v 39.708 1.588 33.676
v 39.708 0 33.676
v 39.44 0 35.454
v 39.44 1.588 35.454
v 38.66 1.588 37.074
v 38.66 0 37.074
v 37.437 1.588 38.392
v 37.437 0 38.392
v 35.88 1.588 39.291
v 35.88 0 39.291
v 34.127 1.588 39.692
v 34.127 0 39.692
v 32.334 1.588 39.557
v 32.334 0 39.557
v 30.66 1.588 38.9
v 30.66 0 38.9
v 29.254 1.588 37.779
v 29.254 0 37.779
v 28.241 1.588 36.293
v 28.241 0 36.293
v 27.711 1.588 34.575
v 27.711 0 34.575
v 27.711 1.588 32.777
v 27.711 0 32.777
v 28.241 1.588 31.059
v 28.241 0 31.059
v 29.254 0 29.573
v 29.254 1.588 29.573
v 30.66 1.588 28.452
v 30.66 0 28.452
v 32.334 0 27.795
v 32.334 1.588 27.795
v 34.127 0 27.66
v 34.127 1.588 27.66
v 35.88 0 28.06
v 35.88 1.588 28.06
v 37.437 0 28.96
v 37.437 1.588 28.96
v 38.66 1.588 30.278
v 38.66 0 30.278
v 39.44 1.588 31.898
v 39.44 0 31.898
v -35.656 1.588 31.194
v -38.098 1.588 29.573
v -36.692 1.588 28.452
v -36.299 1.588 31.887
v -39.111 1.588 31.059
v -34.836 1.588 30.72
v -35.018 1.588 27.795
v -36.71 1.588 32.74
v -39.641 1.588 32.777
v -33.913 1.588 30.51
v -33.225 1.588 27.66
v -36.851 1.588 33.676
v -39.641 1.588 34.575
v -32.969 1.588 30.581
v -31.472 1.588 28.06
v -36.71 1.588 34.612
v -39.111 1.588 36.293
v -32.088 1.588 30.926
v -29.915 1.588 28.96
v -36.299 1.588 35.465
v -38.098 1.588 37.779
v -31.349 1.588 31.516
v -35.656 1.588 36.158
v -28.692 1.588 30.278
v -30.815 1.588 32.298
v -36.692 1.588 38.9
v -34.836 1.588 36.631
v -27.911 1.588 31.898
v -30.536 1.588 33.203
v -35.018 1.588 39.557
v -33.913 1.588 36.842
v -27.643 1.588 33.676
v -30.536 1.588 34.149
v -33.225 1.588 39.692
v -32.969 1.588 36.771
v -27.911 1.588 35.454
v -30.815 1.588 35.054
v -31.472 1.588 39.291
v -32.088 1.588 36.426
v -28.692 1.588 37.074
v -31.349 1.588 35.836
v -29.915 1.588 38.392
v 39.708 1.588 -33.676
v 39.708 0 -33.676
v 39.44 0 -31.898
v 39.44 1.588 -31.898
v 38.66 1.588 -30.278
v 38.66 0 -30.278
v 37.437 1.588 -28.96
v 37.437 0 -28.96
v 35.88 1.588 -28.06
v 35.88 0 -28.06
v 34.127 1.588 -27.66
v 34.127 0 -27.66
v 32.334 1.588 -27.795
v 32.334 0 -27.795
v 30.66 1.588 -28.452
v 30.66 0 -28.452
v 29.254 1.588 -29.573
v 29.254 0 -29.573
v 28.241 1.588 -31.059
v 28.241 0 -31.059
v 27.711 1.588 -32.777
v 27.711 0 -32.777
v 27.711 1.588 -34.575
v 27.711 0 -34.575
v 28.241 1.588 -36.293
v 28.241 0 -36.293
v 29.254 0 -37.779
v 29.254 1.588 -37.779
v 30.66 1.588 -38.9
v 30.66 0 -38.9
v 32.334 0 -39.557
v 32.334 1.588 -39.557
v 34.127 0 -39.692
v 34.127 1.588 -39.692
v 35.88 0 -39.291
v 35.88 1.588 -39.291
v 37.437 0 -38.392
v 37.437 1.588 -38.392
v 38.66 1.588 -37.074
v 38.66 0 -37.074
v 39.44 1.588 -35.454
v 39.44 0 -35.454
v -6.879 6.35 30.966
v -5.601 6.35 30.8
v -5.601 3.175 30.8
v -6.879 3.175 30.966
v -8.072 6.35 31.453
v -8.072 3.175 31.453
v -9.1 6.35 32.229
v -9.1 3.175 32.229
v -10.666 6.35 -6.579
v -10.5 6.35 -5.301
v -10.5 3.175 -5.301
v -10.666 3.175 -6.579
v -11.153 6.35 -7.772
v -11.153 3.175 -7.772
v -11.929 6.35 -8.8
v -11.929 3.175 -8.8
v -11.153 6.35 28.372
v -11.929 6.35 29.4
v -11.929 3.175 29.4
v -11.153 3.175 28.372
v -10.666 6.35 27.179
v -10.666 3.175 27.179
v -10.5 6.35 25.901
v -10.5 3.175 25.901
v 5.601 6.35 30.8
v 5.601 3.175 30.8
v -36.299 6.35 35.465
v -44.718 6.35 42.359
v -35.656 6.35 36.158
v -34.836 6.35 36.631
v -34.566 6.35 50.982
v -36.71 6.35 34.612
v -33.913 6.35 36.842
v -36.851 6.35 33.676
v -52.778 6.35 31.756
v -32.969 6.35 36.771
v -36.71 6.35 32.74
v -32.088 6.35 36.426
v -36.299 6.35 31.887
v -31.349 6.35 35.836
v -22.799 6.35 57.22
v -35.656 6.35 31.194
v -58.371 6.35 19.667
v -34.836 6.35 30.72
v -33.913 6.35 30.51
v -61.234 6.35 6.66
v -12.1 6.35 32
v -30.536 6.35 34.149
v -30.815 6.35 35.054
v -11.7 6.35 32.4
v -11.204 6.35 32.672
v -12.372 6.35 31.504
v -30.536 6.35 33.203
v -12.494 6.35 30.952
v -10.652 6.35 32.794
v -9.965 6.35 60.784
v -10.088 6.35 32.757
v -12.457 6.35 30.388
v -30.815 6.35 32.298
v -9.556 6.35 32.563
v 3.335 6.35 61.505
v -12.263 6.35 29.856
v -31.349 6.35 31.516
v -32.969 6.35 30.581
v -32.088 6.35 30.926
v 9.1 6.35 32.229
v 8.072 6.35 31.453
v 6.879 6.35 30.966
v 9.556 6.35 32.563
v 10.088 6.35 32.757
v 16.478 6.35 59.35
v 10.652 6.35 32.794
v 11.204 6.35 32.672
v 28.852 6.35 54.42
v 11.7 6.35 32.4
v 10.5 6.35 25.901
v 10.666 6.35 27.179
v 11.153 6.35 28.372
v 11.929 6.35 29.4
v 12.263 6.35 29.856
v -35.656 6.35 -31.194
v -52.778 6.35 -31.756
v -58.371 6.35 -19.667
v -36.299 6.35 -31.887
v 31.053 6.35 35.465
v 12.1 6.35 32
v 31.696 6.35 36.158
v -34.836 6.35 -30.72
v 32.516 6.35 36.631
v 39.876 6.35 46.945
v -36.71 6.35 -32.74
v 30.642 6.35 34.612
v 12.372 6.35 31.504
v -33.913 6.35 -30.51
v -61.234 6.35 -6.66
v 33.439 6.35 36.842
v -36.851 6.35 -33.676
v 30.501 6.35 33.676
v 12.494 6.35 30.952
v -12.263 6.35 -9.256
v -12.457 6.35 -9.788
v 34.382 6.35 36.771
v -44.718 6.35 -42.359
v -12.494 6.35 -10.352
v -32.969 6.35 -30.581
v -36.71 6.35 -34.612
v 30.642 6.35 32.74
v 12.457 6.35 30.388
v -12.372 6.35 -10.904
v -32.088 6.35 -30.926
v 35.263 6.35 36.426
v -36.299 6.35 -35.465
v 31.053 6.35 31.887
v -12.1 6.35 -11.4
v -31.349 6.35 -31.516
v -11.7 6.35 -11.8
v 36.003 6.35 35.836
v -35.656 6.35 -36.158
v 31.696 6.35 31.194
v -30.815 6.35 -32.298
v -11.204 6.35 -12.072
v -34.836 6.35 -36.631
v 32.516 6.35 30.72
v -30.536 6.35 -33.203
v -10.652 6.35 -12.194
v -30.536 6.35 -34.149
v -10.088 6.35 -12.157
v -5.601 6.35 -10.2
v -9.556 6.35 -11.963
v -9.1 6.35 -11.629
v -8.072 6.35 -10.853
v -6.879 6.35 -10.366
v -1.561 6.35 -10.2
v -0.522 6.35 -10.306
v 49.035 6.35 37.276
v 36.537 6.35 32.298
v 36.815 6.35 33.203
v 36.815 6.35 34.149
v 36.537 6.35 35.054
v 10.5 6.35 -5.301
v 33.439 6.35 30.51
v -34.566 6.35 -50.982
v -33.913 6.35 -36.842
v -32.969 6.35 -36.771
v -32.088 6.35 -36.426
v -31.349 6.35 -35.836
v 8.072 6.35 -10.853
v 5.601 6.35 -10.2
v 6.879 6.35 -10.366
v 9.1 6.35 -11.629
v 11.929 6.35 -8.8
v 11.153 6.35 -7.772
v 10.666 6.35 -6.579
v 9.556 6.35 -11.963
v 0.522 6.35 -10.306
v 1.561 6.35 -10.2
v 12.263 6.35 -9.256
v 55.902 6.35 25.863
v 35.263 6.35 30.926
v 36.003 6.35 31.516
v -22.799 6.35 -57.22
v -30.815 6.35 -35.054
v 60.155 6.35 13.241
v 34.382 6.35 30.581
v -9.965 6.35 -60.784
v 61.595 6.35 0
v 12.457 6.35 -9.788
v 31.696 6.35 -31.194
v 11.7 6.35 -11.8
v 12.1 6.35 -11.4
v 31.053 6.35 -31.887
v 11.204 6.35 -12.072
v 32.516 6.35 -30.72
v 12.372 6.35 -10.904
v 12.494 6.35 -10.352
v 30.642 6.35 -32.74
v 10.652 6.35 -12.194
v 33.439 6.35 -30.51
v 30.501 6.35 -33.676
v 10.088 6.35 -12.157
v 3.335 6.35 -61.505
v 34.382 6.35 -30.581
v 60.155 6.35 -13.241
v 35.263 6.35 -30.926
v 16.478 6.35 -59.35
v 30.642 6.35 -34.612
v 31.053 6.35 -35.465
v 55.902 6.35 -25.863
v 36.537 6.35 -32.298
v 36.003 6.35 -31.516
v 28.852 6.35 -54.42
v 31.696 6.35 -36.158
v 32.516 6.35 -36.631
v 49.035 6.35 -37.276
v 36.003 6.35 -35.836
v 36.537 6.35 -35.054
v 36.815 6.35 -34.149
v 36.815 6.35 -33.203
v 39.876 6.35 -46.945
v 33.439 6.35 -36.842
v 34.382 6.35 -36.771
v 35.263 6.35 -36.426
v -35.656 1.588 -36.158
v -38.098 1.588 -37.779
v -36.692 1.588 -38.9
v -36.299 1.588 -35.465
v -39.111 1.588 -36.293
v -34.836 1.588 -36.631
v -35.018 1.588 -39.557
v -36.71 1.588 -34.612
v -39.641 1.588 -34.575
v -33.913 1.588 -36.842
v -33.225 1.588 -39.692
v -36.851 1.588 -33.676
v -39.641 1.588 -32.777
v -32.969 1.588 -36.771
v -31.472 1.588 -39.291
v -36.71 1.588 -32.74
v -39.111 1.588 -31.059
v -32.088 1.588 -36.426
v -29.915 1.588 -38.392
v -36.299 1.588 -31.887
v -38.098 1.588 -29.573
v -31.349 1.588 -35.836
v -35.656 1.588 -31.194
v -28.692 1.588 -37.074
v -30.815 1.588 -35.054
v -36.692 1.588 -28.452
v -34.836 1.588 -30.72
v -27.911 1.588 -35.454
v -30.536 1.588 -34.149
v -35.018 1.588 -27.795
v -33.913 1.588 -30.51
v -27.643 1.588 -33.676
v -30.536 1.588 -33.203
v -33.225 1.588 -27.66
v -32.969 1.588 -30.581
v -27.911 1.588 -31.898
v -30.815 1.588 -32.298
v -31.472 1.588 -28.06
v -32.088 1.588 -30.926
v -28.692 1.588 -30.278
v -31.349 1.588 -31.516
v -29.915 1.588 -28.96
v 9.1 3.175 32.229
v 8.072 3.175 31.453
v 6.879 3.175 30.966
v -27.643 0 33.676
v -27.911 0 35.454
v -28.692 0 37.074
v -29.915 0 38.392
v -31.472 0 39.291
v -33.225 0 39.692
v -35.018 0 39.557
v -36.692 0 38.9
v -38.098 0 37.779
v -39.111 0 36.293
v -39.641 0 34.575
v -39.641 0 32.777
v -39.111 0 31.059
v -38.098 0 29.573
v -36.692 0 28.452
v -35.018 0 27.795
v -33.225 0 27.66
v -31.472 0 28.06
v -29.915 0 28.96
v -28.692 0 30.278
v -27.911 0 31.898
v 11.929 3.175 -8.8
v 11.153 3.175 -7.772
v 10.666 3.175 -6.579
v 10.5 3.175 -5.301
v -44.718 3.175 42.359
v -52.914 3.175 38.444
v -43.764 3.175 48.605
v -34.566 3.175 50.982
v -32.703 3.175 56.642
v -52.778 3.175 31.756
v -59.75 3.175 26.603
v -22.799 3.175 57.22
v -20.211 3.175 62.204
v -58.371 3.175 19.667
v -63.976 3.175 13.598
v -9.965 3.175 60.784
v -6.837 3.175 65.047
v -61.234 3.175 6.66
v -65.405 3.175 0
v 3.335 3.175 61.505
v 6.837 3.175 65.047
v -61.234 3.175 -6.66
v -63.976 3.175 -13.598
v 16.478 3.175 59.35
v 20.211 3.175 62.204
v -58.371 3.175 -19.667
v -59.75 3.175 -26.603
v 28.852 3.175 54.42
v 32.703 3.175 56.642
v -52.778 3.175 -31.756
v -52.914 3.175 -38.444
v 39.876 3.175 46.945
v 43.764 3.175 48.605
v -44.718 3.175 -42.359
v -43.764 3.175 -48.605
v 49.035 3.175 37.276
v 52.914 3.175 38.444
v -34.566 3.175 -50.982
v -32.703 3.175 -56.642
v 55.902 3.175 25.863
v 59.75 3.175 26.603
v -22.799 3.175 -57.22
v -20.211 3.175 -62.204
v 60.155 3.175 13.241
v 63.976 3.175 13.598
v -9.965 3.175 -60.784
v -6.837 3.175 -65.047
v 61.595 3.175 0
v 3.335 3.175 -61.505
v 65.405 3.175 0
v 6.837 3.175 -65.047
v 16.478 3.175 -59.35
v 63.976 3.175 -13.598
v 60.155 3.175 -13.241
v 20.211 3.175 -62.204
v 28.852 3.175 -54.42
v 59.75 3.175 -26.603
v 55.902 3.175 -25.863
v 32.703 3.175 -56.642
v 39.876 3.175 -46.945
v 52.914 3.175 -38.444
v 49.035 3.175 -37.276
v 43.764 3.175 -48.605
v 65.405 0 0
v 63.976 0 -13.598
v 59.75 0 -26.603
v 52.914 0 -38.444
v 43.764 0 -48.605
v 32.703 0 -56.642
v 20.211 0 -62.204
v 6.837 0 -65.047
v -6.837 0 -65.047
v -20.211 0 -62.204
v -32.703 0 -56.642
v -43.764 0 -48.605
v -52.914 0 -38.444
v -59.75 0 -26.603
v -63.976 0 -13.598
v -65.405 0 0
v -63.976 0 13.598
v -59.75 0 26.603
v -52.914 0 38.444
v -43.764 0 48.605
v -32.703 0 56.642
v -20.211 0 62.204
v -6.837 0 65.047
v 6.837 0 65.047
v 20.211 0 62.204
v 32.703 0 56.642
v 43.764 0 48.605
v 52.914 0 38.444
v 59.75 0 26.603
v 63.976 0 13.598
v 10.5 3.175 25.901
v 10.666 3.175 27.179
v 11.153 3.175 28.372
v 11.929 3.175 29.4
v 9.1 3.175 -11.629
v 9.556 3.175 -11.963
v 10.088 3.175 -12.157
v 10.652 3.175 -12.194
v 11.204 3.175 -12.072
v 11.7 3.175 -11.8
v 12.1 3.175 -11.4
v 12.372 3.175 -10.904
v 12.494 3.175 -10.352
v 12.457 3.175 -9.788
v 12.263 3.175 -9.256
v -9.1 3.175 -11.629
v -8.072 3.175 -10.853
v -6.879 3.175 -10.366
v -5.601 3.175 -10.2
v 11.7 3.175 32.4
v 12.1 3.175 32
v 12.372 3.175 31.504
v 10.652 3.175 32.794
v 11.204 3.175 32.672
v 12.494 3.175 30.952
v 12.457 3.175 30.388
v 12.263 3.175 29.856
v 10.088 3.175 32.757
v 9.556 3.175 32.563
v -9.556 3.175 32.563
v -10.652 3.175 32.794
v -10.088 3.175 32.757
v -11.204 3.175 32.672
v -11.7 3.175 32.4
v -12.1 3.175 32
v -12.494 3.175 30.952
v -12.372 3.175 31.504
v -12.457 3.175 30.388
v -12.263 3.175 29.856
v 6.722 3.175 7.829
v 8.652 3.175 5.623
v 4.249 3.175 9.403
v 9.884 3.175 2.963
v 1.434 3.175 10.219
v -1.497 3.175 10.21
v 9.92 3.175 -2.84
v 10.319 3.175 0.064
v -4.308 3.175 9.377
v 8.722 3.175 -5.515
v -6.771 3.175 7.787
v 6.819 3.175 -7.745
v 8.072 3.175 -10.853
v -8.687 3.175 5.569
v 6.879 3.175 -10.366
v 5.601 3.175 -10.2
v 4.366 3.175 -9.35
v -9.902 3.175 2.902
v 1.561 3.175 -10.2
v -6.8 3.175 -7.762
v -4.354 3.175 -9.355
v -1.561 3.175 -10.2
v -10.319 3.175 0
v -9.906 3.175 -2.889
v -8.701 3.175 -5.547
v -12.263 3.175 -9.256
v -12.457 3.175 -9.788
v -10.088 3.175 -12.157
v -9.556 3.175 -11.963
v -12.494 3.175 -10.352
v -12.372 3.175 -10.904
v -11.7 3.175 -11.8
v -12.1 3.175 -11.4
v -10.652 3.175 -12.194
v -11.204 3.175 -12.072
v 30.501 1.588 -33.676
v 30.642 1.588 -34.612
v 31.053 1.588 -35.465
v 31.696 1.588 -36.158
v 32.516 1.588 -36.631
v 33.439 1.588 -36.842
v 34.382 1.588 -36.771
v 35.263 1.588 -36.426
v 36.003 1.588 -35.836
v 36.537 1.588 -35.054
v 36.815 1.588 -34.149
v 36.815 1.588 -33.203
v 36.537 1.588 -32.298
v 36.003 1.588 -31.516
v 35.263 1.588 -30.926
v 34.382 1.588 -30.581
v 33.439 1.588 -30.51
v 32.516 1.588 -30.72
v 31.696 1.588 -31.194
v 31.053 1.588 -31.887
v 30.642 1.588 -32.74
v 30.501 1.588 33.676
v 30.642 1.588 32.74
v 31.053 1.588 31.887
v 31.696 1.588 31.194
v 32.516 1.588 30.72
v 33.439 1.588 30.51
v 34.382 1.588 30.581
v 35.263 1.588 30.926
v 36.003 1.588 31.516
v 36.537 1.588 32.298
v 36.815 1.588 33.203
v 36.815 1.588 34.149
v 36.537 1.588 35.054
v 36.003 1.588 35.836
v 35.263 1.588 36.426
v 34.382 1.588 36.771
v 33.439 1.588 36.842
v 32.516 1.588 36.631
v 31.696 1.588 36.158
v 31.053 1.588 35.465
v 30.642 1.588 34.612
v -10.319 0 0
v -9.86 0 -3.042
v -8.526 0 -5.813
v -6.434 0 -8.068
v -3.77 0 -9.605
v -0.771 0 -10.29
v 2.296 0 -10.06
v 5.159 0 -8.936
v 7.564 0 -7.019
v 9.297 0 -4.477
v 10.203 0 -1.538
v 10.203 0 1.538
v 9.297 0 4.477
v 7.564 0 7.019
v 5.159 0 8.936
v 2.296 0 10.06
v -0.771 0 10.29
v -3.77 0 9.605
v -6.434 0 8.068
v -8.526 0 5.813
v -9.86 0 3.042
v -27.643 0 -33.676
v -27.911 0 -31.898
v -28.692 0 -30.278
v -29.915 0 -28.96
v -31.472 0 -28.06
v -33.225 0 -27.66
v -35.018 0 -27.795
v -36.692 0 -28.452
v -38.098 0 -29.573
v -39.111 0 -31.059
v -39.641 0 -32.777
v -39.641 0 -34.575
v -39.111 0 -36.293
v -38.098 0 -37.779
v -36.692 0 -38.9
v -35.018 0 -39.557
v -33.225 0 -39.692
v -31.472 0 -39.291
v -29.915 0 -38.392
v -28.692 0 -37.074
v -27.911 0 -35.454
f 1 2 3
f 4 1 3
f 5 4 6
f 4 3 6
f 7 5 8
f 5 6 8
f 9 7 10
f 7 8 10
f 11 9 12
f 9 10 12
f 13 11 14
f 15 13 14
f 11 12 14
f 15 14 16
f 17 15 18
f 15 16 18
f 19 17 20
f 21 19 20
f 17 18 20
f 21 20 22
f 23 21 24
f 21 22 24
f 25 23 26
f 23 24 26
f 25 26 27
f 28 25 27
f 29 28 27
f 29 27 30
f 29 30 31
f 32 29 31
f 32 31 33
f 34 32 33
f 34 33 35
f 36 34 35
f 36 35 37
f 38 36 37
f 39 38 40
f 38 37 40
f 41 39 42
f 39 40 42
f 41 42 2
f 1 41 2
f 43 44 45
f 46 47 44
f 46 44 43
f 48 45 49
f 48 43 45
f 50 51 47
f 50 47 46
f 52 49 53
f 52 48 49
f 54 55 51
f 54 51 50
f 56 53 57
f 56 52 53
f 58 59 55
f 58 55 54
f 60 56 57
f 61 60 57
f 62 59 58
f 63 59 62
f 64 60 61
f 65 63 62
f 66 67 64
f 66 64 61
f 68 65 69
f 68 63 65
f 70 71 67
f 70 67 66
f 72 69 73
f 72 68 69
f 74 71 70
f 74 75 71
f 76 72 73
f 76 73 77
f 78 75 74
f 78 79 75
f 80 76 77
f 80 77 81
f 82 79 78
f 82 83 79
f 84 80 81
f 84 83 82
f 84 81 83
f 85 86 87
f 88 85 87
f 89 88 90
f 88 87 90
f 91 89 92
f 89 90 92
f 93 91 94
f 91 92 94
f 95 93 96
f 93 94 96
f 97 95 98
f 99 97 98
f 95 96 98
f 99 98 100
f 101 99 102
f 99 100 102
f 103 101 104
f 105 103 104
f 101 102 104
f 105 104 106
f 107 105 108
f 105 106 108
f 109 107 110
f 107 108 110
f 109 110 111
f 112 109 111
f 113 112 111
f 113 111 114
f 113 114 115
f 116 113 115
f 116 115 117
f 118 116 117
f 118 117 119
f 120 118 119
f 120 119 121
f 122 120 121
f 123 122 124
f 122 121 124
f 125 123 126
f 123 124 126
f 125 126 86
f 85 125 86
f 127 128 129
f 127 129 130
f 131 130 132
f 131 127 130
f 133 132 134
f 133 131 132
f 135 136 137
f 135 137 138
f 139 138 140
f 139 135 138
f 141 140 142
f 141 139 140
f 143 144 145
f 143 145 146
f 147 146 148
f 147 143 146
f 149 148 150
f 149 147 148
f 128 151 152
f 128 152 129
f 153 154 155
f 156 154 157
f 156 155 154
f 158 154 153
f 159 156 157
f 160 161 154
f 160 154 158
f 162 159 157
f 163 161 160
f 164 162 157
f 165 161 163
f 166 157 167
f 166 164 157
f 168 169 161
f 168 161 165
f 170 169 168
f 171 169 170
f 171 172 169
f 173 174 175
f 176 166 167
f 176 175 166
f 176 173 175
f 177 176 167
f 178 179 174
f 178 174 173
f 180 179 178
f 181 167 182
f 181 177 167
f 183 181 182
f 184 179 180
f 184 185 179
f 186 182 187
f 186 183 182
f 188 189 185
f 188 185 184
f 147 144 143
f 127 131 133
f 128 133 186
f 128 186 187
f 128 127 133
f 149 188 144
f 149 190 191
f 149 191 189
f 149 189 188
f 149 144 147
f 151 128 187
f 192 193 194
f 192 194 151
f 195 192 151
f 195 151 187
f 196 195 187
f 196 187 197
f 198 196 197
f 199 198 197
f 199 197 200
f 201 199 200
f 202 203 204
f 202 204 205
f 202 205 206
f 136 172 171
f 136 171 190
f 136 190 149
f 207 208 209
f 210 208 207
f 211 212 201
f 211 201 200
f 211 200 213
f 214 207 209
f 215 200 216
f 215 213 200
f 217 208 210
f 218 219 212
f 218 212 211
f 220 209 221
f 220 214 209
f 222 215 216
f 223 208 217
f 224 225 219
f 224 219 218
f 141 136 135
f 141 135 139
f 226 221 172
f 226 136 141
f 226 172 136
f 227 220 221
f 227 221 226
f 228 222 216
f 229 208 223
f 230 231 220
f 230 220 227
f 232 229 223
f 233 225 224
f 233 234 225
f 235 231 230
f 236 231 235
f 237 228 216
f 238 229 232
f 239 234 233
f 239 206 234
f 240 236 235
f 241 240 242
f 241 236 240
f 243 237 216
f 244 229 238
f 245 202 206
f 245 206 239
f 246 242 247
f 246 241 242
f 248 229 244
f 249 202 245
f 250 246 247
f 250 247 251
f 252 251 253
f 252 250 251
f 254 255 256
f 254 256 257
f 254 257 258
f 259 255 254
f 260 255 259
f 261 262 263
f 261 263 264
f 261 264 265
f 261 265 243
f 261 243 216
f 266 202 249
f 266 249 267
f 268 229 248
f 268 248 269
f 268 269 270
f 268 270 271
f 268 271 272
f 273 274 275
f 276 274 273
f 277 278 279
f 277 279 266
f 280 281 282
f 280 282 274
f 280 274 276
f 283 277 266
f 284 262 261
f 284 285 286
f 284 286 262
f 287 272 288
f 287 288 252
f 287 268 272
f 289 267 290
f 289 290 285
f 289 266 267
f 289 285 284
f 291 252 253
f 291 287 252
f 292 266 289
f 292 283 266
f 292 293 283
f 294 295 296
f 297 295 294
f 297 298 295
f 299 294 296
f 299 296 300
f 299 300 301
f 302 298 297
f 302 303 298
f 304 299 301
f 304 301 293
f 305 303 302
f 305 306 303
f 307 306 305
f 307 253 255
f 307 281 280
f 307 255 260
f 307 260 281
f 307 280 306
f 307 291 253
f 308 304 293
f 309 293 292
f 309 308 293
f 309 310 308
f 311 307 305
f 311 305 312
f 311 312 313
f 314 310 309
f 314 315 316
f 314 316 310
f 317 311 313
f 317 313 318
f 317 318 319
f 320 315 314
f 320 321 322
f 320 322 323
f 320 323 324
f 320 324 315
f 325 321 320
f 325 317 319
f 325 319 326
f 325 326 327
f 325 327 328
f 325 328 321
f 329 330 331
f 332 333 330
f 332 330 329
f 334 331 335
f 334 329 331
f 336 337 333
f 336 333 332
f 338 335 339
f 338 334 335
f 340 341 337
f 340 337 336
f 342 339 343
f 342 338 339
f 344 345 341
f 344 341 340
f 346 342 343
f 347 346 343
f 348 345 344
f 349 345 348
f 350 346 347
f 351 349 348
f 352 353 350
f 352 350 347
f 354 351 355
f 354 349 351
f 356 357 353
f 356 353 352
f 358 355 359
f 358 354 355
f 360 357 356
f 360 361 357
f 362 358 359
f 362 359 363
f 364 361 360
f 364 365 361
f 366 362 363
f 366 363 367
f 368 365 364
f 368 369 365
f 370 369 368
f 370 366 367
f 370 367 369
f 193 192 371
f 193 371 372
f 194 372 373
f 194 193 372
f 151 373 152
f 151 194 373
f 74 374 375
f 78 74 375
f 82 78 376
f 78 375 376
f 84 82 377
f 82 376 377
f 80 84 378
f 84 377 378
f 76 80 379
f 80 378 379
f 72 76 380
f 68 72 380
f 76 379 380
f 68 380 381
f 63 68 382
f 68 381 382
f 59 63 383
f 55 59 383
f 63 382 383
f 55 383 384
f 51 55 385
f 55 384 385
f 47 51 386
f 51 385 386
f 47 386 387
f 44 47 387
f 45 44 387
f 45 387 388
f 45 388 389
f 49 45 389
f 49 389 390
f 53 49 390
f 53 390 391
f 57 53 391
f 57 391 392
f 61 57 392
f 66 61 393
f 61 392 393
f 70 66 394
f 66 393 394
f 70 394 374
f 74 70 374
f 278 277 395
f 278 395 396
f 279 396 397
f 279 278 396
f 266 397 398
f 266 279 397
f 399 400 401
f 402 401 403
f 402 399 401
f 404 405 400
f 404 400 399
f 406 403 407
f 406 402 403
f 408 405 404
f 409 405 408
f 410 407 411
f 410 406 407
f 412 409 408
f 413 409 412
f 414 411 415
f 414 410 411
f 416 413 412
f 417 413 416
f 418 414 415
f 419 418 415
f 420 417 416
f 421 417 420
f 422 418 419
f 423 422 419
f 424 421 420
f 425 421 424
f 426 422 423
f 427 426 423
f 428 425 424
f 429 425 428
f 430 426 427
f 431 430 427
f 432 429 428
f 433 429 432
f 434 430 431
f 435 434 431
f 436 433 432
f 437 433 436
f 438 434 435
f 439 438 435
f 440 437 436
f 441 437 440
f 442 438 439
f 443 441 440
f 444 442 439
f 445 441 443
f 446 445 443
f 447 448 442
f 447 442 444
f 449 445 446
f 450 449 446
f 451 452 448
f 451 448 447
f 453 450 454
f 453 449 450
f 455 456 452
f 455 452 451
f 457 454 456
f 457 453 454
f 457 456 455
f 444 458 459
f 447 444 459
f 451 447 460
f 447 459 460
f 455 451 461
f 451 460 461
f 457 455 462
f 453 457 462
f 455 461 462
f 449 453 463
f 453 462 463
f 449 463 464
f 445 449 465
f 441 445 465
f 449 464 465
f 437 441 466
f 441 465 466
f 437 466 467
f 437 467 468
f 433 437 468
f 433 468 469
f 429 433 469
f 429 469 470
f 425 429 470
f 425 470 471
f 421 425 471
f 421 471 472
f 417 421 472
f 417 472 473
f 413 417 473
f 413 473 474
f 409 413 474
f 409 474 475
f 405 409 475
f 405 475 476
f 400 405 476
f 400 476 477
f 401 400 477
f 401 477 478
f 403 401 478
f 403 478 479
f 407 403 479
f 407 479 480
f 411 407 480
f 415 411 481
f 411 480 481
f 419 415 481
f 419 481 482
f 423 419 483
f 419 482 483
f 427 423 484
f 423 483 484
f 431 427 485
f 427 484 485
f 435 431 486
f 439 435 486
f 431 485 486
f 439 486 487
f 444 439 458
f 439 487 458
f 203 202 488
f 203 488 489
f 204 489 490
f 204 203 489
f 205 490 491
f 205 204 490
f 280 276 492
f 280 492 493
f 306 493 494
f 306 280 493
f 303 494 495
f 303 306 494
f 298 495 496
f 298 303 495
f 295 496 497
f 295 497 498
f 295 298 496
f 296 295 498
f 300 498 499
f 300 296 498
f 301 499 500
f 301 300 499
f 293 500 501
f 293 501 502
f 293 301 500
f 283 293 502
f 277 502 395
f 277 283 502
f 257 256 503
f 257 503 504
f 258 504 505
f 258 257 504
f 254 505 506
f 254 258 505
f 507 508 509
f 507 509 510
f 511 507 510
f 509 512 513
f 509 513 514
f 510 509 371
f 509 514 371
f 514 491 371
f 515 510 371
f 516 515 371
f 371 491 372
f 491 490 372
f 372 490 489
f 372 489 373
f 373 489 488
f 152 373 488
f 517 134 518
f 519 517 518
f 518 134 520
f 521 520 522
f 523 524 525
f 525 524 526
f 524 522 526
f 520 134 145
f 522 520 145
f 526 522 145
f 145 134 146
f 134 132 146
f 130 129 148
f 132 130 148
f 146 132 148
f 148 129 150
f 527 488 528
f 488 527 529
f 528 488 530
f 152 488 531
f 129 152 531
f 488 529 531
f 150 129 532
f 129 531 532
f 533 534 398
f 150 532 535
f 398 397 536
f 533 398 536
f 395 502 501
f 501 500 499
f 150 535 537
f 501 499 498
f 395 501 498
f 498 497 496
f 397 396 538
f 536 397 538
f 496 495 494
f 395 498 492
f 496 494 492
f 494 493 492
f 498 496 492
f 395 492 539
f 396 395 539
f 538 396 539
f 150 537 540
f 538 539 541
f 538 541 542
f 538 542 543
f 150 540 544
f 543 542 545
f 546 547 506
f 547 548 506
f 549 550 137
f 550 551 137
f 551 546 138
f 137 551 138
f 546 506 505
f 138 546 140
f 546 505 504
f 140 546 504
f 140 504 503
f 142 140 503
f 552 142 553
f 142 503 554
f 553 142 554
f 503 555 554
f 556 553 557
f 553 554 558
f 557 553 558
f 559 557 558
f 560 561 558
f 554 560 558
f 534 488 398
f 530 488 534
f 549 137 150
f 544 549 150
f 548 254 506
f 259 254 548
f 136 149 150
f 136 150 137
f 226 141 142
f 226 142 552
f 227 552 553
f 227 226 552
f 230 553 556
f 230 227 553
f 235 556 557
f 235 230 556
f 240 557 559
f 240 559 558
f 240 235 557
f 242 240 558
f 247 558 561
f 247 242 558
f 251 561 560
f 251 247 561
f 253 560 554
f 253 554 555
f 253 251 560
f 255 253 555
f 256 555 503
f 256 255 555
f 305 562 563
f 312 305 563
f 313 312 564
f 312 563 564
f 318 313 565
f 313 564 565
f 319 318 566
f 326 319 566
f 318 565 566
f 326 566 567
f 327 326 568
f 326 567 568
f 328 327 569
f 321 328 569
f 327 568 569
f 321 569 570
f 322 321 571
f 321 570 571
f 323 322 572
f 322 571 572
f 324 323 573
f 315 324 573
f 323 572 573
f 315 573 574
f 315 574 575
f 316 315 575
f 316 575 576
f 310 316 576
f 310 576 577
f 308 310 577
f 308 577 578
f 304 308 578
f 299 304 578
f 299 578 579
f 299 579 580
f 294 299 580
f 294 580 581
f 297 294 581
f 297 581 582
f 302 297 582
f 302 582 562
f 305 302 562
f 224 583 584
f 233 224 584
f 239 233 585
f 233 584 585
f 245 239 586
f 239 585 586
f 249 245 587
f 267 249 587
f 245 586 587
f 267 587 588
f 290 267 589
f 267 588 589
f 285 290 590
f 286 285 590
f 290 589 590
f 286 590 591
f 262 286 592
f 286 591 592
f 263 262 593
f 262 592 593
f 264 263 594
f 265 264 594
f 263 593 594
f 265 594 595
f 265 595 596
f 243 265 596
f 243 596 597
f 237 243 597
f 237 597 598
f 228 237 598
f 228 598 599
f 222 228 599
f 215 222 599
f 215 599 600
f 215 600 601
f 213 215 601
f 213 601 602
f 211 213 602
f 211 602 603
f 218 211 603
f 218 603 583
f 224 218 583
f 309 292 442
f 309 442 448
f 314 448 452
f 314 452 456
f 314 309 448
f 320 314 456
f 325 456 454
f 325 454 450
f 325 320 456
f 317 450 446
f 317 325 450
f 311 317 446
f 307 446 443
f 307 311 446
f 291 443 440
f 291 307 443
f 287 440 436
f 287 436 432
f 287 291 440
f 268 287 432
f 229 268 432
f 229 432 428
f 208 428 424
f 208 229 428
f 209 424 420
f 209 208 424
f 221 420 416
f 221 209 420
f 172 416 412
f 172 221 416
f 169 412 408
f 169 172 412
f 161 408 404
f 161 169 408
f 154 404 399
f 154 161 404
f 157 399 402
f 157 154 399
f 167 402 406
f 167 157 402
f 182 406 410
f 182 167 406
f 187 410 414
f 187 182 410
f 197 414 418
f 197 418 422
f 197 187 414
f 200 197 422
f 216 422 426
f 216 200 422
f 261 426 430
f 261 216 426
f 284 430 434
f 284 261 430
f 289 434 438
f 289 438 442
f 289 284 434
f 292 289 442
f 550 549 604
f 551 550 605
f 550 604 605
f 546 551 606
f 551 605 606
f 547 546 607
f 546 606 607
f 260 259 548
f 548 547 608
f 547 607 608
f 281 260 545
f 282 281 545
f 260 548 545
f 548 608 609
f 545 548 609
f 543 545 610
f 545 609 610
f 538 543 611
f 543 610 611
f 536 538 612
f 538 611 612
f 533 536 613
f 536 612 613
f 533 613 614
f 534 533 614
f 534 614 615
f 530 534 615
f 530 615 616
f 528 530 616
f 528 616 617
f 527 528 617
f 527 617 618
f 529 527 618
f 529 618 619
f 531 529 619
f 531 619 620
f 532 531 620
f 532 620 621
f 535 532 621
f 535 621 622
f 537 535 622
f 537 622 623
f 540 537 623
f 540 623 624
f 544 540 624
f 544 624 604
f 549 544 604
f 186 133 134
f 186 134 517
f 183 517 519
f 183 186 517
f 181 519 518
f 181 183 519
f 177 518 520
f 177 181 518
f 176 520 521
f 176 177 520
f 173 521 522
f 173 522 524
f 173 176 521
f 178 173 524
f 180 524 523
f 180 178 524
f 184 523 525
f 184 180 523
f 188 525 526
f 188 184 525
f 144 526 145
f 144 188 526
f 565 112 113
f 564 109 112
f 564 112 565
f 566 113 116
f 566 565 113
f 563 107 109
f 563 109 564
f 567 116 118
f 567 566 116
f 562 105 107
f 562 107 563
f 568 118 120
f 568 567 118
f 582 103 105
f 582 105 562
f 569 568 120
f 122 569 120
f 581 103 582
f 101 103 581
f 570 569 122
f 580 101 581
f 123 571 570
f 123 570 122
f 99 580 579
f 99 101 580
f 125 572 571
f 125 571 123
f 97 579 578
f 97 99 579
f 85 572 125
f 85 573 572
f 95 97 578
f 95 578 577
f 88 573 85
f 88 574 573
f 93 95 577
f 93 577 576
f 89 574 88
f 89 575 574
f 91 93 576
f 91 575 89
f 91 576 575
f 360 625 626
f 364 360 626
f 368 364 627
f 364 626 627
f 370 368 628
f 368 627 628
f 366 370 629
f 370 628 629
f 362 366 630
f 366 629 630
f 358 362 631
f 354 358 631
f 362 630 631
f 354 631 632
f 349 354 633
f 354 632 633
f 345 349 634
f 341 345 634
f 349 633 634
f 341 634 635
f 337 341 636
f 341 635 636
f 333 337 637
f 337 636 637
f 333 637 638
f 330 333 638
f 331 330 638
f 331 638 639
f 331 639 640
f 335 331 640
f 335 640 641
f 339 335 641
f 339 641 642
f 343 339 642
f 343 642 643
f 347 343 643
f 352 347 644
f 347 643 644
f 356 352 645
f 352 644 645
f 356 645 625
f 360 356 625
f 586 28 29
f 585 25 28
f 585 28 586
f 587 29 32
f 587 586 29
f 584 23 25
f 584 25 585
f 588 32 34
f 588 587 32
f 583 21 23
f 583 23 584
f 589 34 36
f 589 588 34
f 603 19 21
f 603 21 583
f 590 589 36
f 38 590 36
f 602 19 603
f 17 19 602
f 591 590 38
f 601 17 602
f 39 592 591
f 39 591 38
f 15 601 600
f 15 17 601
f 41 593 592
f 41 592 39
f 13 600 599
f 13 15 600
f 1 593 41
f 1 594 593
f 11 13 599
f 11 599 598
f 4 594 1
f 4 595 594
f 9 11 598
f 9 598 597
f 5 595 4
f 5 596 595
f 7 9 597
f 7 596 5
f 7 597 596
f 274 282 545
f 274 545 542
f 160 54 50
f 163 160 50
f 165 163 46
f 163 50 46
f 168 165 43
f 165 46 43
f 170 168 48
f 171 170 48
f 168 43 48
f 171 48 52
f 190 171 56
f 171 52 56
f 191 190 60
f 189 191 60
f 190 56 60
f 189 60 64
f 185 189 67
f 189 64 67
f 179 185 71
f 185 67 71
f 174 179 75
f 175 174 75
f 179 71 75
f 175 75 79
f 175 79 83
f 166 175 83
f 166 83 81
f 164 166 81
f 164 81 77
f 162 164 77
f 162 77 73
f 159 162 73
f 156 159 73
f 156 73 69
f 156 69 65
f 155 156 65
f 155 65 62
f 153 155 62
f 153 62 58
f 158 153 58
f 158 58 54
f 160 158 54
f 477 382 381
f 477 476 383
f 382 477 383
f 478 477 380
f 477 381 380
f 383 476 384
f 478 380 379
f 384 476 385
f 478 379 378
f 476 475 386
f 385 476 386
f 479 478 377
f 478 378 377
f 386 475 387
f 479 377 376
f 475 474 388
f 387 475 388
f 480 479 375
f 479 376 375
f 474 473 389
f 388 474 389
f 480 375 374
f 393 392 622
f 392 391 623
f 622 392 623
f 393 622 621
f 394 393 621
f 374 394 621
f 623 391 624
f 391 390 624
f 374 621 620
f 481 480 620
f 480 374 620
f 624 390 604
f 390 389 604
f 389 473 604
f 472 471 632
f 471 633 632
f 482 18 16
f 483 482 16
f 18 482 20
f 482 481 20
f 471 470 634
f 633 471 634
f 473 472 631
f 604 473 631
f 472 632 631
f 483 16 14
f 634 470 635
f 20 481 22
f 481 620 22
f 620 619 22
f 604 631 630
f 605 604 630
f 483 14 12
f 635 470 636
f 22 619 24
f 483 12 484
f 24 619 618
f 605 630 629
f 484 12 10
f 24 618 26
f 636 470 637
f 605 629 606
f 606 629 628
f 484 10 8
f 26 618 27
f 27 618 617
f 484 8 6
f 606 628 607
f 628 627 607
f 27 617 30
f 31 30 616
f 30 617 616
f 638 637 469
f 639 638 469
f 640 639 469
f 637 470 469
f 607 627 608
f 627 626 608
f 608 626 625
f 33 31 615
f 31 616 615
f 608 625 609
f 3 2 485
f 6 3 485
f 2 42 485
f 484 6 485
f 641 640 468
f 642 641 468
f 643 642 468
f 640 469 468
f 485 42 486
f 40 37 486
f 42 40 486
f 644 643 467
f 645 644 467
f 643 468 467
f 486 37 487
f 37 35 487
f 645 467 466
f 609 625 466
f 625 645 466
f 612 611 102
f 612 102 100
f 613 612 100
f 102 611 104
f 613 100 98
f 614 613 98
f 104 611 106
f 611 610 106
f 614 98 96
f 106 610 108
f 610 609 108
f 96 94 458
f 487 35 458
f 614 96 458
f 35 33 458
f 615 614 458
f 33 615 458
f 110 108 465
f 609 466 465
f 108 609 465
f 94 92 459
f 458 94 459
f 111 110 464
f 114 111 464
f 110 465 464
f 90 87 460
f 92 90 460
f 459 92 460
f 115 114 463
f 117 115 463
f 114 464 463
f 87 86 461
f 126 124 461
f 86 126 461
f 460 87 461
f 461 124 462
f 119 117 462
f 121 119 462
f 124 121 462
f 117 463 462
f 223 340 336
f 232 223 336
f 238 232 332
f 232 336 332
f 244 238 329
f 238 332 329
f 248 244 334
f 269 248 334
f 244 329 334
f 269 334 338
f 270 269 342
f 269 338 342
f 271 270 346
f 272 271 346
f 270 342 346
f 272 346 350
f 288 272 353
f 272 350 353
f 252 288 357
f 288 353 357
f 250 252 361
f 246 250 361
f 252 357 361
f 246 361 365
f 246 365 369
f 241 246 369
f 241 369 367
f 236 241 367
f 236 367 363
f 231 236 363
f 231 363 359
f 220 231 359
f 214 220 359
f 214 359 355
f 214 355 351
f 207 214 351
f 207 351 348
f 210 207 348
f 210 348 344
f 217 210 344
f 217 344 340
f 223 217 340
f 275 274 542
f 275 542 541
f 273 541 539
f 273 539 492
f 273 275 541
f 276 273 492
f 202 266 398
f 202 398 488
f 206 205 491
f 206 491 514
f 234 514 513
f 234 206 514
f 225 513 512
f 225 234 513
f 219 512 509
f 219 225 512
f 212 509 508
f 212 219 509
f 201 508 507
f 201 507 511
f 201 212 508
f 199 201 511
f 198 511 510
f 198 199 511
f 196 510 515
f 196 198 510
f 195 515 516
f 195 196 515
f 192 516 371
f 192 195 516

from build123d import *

# Parameters (mm, degrees)
SKETCH2_R                       = 65.405
BOSS_EXTRUDE1_DEPTH             = 6.35
SKETCH4_R                       = 65.405
SKETCH4_R_2                     = 61.595
CUT_EXTRUDE1_DEPTH              = 3.175
F_1_4_0_25_DIAMETER_HOLE1_D     = 6.35
F_13_16_0_8125_DIAMETER_HOLE1_D = 20.6375
CUT_EXTRUDE3_DEPTH              = 3.175
SKETCH9_R                       = 6.0325
CUT_EXTRUDE2_DEPTH              = 1.5875


with BuildPart() as part:
    # Sketch2 → Boss-Extrude1 (new body)
    with BuildSketch(Plane(origin=(0, 0, 0), x_dir=(1, 0, 0), z_dir=(0, 1, 0))):
        Circle(SKETCH2_R)
    extrude(amount=BOSS_EXTRUDE1_DEPTH)

    # Sketch4 → Cut-Extrude1 (cut)
    with BuildSketch(Plane(origin=(0, 6.35, 0), x_dir=(1, 0, 0), z_dir=(0, 1, 0))):
        Circle(SKETCH4_R)
        Circle(SKETCH4_R_2, mode=Mode.SUBTRACT)
    extrude(amount=-CUT_EXTRUDE1_DEPTH, mode=Mode.SUBTRACT)

    # 1/4 (0.25) Diameter Hole1 (through all)
    with Locations(Plane(origin=(0, 6.35, 0), x_dir=(1, 0, 0), z_dir=(0, 1, 0))):
        with Locations((-33.675960454, 33.675960454), (-33.675960454, -33.675960454), (33.675960454, 33.675960454), (33.675960454, -33.675960454)):
            Hole(F_1_4_0_25_DIAMETER_HOLE1_D / 2)

    # 13/16 (0.8125) Diameter Hole1 (through all)
    with Locations(Plane(origin=(0, 6.35, 0), x_dir=(1, 0, 0), z_dir=(0, 1, 0))):
        with Locations((0, 0)):
            Hole(F_13_16_0_8125_DIAMETER_HOLE1_D / 2)

    # Sketch11 → Cut-Extrude3 (cut)
    with BuildSketch(Plane(origin=(0, 6.35, 0), x_dir=(1, 0, 0), z_dir=(0, 1, 0))):
        with BuildLine():
            Line((-5.601020514, 10.2), (5.601020514, 10.2))
            ThreePointArc((5.601020514, 10.2), (7.490842879, 10.570899501), (9.100291576, 11.628571429))
            ThreePointArc((9.100291576, 11.628571429), (11.914213562, 11.614213562), (11.928571429, 8.800291576))
            ThreePointArc((11.928571429, 8.800291576), (10.870899501, 7.190842879), (10.5, 5.301020514))
            Line((10.5, 5.301020514), (10.5, -25.901020514))
            ThreePointArc((10.5, -25.901020514), (10.870899501, -27.790842879), (11.928571429, -29.400291576))
            ThreePointArc((11.928571429, -29.400291576), (11.914213562, -32.214213562), (9.100291576, -32.228571429))
            ThreePointArc((9.100291576, -32.228571429), (7.490842879, -31.170899501), (5.601020514, -30.8))
            Line((5.601020514, -30.8), (-5.601020514, -30.8))
            ThreePointArc((-5.601020514, -30.8), (-7.490842879, -31.170899501), (-9.100291576, -32.228571429))
            ThreePointArc((-9.100291576, -32.228571429), (-11.914213562, -32.214213562), (-11.928571429, -29.400291576))
            ThreePointArc((-11.928571429, -29.400291576), (-10.870899501, -27.790842879), (-10.5, -25.901020514))
            Line((-10.5, -25.901020514), (-10.5, 5.301020514))
            ThreePointArc((-10.5, 5.301020514), (-10.870899501, 7.190842879), (-11.928571429, 8.800291576))
            ThreePointArc((-11.928571429, 8.800291576), (-11.914213562, 11.614213562), (-9.100291576, 11.628571429))
            ThreePointArc((-9.100291576, 11.628571429), (-7.490842879, 10.570899501), (-5.601020514, 10.2))
        make_face()
    extrude(amount=-CUT_EXTRUDE3_DEPTH, mode=Mode.SUBTRACT)

    # Sketch9 → Cut-Extrude2 (cut)
    with BuildSketch(Plane.XZ):
        with Locations((-33.675960454, 33.675960454)):
            Circle(SKETCH9_R)
        with Locations((33.675960454, 33.675960454)):
            Circle(SKETCH9_R)
        with Locations((33.675960454, -33.675960454)):
            Circle(SKETCH9_R)
        with Locations((-33.675960454, -33.675960454)):
            Circle(SKETCH9_R)
    extrude(amount=-CUT_EXTRUDE2_DEPTH, mode=Mode.SUBTRACT)


solid = part.part
